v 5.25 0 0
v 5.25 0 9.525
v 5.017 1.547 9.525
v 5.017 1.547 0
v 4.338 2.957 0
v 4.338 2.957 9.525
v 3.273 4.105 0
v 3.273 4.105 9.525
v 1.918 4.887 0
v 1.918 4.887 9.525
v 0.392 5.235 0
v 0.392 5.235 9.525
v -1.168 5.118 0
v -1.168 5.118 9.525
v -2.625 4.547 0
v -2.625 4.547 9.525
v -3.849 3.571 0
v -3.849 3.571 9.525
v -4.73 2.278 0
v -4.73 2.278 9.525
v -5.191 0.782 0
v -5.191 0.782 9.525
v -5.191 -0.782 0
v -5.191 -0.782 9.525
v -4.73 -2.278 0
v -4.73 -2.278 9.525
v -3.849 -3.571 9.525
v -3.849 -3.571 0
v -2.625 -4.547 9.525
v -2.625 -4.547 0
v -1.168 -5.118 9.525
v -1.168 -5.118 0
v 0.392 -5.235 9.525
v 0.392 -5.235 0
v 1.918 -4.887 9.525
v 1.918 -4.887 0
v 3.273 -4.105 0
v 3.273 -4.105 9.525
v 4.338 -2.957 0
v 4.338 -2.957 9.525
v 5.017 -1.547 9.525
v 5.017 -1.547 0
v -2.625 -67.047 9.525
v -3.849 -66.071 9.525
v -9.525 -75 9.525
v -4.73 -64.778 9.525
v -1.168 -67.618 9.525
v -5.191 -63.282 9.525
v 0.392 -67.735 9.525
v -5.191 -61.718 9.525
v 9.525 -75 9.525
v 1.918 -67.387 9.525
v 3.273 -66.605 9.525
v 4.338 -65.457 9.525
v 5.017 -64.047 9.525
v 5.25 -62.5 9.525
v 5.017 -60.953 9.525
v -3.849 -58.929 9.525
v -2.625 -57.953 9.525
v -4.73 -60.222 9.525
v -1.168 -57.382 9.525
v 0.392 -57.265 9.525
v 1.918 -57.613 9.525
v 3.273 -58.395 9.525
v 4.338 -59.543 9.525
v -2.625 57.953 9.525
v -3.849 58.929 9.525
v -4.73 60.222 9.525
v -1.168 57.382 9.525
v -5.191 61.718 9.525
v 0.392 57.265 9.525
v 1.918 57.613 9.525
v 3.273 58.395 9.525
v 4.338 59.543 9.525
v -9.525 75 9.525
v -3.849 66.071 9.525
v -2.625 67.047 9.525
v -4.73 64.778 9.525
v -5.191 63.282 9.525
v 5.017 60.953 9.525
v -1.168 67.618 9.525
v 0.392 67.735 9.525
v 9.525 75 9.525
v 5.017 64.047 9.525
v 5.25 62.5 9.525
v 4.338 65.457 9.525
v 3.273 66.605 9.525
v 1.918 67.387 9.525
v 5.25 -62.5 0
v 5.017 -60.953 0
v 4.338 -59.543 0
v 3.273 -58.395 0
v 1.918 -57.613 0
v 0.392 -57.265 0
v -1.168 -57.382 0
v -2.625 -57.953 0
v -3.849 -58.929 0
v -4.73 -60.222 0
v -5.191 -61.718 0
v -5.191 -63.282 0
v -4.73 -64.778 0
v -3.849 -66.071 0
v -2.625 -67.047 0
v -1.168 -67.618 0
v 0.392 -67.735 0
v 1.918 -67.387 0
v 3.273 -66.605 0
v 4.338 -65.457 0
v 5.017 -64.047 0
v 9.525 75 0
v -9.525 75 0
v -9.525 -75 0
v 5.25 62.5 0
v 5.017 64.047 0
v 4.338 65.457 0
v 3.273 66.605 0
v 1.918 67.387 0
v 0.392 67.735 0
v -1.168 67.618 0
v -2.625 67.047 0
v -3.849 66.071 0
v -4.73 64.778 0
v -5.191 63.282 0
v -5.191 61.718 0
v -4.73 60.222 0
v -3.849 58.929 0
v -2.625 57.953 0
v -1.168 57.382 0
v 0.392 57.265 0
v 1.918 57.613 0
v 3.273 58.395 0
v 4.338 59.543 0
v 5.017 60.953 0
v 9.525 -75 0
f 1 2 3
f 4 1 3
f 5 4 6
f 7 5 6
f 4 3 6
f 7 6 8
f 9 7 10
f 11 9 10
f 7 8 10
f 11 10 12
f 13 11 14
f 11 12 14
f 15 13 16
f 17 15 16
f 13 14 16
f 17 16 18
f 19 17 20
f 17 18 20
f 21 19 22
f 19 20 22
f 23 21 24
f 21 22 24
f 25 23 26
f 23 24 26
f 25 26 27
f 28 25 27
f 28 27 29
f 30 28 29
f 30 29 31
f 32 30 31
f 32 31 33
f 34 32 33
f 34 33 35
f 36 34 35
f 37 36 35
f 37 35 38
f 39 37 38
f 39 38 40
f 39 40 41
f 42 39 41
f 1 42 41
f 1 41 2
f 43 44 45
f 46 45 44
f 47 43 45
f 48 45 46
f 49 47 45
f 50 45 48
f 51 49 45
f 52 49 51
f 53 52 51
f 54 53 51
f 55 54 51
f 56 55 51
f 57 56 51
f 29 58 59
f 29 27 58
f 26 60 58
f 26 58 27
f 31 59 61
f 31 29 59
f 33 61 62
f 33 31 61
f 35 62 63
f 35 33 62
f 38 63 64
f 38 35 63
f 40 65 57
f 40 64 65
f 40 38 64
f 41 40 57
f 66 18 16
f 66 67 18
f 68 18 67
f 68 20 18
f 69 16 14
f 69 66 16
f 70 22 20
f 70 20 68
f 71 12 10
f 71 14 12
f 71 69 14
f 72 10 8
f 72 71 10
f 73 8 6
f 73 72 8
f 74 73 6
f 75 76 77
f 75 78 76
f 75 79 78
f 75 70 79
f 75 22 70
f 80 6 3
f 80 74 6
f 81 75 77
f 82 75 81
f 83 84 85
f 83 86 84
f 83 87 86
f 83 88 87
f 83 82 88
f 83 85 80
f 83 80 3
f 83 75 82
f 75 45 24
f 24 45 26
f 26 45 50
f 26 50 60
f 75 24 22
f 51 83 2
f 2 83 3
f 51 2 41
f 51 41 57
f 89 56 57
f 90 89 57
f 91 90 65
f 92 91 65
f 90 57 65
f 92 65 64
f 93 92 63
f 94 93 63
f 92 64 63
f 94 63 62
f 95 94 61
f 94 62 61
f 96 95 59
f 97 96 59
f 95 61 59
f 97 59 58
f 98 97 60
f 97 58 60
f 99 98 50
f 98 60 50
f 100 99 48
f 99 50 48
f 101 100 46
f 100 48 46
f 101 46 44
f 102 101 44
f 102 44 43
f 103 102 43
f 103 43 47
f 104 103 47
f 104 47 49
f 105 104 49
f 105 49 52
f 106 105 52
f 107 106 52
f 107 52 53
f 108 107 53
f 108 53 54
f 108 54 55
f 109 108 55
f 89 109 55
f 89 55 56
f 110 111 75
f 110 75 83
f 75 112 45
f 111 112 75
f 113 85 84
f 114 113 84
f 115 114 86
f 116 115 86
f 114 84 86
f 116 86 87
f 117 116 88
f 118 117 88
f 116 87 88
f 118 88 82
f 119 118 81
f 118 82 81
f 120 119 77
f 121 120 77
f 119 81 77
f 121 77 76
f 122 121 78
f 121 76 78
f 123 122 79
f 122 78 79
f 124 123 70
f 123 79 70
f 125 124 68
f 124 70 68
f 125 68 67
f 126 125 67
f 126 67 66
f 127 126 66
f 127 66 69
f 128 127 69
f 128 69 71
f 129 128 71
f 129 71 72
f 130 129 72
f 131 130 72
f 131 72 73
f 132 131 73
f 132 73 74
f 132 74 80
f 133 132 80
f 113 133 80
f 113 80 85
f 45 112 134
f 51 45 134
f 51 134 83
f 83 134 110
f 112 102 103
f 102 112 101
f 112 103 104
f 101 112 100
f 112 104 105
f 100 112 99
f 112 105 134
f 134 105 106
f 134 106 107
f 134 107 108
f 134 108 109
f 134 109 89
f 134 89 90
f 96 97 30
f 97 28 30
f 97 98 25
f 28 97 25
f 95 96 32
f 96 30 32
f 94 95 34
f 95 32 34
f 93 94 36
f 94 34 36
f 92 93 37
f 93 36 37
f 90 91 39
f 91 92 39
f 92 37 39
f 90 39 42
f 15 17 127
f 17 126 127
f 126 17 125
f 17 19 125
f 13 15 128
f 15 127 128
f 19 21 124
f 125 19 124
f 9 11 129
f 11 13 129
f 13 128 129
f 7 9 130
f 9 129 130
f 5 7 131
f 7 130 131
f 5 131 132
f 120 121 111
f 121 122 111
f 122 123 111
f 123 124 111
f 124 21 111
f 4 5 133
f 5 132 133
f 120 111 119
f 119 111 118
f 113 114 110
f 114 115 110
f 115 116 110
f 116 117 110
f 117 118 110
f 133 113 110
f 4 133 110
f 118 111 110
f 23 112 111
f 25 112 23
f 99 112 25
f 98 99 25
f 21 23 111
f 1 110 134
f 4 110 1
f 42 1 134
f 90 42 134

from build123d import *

# Parameters (mm, degrees)
F0_W     = 19.05
F0_H     = 150
F1_DEPTH = 9.525
F2_R     = 5.25
F3_DEPTH = 25.4
F4_R     = 5.25
F5_DEPTH = 25.4


# Not quite as in the source:
# - a length typed as a fraction of an inch, garbled in the dataset ("3 / 203.2 mm" for 3/8 in), is restored


with BuildPart() as f1:
    # F0 (on Top) → F1 (new body)
    with BuildSketch(Plane.XY):
        Rectangle(F0_W, F0_H)
    extrude(amount=F1_DEPTH)

    # F2 (on face) → F3 (cut)
    with BuildSketch(Plane.XY.offset(9.525)):
        with Locations((0, 62.5)):
            Circle(F2_R)
        with Locations((0, -62.5)):
            Circle(F2_R)
    extrude(amount=-F3_DEPTH, mode=Mode.SUBTRACT)

    # F4 (on face) → F5 (cut)
    with BuildSketch(Plane.XY.offset(9.525)):
        Circle(F4_R)
    extrude(amount=-F5_DEPTH, mode=Mode.SUBTRACT)


solid = f1.part
